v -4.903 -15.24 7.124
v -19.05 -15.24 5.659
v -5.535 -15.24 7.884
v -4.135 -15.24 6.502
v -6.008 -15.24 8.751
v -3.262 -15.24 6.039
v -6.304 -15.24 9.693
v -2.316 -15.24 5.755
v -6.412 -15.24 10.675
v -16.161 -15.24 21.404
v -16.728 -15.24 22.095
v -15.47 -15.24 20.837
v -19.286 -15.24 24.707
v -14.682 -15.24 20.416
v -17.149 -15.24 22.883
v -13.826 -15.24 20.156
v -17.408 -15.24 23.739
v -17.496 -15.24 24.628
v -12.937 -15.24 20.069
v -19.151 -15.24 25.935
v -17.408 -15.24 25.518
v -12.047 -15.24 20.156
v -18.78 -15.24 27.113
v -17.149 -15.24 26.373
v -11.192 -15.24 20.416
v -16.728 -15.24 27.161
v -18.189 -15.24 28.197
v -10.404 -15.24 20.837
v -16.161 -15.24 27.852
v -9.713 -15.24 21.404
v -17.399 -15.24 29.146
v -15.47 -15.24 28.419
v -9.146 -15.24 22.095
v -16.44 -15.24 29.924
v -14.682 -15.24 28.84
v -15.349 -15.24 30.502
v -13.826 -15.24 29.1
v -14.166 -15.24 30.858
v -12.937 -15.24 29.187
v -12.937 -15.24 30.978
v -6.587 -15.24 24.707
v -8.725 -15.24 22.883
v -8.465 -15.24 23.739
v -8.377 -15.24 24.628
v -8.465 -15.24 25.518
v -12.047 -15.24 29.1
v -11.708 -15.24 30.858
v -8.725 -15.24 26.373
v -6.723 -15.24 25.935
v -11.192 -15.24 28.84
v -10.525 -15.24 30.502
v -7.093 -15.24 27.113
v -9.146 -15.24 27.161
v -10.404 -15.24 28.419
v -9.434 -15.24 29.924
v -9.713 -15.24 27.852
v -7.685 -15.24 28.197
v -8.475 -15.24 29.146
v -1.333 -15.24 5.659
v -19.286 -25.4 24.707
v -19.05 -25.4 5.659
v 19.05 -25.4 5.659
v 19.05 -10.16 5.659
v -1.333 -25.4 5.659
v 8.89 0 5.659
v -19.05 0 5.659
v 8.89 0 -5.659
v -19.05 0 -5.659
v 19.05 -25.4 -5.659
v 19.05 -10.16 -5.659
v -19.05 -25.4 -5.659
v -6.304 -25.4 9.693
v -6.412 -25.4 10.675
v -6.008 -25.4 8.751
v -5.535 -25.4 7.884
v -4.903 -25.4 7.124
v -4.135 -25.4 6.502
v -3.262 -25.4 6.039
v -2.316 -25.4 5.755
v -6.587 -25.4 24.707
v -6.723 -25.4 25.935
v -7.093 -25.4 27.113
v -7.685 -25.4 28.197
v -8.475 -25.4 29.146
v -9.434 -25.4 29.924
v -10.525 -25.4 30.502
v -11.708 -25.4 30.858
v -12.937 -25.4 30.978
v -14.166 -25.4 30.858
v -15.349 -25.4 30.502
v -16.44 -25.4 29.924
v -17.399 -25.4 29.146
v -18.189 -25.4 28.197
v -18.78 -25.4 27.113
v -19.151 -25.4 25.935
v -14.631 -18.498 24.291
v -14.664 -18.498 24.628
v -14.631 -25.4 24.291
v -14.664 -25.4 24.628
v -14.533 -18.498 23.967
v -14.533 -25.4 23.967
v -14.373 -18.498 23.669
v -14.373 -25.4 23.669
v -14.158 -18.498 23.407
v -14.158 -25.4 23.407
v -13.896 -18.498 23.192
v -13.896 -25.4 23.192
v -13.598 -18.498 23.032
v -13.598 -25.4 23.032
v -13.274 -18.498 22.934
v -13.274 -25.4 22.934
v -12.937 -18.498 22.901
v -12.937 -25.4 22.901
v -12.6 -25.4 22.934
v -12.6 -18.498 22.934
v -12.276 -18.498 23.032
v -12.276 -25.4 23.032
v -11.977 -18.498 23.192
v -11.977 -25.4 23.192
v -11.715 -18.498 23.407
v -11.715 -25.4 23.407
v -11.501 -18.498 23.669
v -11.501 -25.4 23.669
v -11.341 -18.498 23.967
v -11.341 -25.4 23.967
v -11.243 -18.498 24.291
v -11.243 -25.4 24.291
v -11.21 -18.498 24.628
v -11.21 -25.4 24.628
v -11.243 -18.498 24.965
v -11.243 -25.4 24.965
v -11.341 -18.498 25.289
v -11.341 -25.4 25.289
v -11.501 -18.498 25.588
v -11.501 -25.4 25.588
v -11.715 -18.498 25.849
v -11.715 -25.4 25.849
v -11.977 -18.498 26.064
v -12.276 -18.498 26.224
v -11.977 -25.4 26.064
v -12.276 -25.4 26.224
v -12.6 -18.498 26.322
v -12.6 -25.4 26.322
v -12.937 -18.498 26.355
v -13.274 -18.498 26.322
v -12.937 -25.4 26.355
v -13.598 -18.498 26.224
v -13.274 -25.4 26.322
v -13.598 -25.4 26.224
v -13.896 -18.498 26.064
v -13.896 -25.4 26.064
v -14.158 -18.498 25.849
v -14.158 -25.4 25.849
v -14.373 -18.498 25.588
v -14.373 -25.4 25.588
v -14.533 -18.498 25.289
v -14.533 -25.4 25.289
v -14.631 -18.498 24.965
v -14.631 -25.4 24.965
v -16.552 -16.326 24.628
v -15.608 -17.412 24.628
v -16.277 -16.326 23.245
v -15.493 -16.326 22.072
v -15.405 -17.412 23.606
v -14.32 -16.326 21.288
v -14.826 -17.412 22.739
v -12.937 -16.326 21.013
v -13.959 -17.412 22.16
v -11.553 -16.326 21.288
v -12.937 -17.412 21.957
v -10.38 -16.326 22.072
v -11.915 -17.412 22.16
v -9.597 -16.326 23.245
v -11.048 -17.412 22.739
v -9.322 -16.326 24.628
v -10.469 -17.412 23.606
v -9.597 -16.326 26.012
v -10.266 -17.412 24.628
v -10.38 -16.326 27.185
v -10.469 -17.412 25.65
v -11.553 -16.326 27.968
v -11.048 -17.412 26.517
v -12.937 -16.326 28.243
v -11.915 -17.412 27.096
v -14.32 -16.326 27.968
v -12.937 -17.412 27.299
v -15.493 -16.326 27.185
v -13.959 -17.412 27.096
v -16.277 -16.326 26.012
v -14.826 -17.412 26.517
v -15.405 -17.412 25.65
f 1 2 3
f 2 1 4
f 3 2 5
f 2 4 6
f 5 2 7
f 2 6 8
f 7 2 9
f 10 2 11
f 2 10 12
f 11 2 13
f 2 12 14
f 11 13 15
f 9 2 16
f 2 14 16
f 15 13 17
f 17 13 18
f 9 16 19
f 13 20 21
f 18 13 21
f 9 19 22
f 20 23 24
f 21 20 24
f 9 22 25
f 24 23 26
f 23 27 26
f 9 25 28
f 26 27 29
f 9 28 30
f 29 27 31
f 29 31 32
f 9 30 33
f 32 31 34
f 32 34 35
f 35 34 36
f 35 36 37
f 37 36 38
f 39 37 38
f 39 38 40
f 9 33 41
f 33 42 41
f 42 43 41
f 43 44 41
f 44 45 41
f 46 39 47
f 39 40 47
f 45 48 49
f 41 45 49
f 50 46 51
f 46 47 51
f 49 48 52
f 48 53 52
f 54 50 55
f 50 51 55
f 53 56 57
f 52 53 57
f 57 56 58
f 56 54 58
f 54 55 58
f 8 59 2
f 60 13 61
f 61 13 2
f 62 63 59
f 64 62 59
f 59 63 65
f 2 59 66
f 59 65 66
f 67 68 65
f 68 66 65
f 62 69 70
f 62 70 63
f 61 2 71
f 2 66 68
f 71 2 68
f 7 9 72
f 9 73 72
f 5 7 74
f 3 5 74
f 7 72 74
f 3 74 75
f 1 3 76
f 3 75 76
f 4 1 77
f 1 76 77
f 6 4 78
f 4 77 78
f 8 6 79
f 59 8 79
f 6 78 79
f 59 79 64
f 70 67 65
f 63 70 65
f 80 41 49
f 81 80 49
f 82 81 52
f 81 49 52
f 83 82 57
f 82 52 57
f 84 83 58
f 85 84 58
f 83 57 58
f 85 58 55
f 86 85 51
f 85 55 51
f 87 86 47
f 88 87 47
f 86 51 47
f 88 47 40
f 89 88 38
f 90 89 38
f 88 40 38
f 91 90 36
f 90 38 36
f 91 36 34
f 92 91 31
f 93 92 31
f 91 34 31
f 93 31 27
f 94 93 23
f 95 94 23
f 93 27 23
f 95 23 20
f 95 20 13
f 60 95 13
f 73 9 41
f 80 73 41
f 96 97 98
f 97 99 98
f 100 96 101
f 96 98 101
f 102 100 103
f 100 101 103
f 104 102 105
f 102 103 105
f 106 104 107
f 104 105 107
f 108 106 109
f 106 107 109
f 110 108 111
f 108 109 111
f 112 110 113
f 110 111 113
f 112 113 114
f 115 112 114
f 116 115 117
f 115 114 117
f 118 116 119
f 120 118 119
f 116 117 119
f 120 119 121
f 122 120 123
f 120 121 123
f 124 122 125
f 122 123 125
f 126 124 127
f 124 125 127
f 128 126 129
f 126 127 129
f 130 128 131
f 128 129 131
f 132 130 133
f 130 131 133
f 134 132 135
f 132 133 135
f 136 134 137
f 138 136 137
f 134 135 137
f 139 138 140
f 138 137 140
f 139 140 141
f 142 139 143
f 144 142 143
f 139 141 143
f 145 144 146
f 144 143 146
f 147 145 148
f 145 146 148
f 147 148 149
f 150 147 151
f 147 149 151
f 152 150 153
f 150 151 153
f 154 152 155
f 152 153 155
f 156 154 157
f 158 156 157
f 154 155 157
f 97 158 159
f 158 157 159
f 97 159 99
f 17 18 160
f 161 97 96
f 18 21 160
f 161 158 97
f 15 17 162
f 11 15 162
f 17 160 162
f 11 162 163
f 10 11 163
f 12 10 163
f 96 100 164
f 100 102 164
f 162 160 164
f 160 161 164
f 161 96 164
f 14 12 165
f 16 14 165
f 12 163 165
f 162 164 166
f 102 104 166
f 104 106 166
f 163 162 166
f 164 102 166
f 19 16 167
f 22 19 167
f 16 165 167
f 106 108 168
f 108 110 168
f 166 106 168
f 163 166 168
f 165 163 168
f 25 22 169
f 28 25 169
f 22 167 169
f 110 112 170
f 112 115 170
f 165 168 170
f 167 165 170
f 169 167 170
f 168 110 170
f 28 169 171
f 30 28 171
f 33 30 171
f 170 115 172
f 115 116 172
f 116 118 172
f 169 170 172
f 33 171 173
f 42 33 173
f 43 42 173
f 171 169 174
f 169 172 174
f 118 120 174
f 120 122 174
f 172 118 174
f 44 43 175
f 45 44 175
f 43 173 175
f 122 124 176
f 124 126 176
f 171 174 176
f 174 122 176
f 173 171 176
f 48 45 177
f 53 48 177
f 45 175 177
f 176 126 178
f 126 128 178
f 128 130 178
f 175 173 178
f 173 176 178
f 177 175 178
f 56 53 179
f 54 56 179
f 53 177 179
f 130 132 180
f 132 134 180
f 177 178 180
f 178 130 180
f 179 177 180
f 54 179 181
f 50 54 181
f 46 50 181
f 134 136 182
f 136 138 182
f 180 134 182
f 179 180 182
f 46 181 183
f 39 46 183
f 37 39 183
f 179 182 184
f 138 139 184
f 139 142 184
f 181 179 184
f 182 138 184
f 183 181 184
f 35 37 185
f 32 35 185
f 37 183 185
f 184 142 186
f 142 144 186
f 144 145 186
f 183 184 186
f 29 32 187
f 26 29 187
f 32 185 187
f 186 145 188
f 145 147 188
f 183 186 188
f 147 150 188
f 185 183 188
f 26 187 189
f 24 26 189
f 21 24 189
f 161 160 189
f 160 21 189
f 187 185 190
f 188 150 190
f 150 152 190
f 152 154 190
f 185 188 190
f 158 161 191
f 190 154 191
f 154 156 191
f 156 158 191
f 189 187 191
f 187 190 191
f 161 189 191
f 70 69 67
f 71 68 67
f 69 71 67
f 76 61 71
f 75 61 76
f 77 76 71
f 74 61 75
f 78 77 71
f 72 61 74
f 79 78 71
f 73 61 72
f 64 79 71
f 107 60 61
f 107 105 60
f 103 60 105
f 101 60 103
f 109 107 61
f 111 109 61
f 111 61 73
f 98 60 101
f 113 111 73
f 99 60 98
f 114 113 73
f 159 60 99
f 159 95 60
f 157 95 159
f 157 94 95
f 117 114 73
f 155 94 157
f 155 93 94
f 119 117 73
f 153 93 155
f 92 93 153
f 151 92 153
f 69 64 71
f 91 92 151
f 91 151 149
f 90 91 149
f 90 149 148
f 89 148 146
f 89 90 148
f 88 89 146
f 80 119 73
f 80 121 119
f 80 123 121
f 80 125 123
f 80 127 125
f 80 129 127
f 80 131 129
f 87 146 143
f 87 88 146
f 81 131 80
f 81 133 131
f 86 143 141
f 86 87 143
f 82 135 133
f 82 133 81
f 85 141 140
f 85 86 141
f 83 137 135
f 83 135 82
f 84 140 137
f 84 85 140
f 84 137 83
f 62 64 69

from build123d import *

# Parameters (mm, degrees)
F1_DEPTH       = 25.4
F2_DEPTH       = 15.24
F3_D           = 3.4544
F3_START       = 15.24
F3_CSINK_D     = 9.1186
F3_CSINK_ANGLE = 82
F4_R           = 5.08
F5_SIZE        = 10.16


with BuildPart() as f1:
    # F0 (on Front) → F1 (new body)
    with BuildSketch(Plane.XZ):
        Polygon((19.05, -5.6587588522), (19.05, 5.6587588522), (-6.35, 5.6587588522), (-19.05, 5.6587588522), (-19.05, -5.6587588522), align=None)
        with BuildLine():
            Line((-19.05, 5.6587588522), (-6.35, 5.6587588522))
            Line((-6.35, 5.6587588522), (-6.5872897774, 24.7072809356))
            ThreePointArc((-6.5872897774, 24.7072809356), (-12.9367971385, 30.9781843431), (-19.2863044996, 24.7072809356))
            Line((-19.2863044996, 24.7072809356), (-19.05, 5.6587588522))
        make_face()
    extrude(amount=F1_DEPTH)

    # F0 (on Front) → F2 (cut)
    with BuildSketch(Plane.XZ):
        with BuildLine():
            Line((-19.05, 5.6587588522), (-6.35, 5.6587588522))
            Line((-6.35, 5.6587588522), (-6.5872897774, 24.7072809356))
            ThreePointArc((-6.5872897774, 24.7072809356), (-12.9367971385, 30.9781843431), (-19.2863044996, 24.7072809356))
            Line((-19.2863044996, 24.7072809356), (-19.05, 5.6587588522))
        make_face()
    extrude(amount=F2_DEPTH, mode=Mode.SUBTRACT)

    # F3 (through all)
    # its depths count from where the whole tool has entered the part; down to there all is cleared
    with Locations(Plane(origin=(0, 0, 0), x_dir=(1, 0, 0), z_dir=(0, 1, 0)).offset(-F3_START)):
        with Locations((-12.9367971385, -24.6281843431)):
            CounterSinkHole(F3_D / 2, F3_CSINK_D / 2, counter_sink_angle=F3_CSINK_ANGLE)

    # F4
    f4_edges = [f1.edges().sort_by_distance(p)[0] for p in [
        (-6.35, -20.32, 5.658759),
    ]]
    fillet(f4_edges, radius=F4_R)

    # F5
    f5_edges = [f1.edges().sort_by_distance(p)[0] for p in [
        (19.05, 0, 0),
    ]]
    chamfer(f5_edges, length=F5_SIZE)


solid = f1.part
